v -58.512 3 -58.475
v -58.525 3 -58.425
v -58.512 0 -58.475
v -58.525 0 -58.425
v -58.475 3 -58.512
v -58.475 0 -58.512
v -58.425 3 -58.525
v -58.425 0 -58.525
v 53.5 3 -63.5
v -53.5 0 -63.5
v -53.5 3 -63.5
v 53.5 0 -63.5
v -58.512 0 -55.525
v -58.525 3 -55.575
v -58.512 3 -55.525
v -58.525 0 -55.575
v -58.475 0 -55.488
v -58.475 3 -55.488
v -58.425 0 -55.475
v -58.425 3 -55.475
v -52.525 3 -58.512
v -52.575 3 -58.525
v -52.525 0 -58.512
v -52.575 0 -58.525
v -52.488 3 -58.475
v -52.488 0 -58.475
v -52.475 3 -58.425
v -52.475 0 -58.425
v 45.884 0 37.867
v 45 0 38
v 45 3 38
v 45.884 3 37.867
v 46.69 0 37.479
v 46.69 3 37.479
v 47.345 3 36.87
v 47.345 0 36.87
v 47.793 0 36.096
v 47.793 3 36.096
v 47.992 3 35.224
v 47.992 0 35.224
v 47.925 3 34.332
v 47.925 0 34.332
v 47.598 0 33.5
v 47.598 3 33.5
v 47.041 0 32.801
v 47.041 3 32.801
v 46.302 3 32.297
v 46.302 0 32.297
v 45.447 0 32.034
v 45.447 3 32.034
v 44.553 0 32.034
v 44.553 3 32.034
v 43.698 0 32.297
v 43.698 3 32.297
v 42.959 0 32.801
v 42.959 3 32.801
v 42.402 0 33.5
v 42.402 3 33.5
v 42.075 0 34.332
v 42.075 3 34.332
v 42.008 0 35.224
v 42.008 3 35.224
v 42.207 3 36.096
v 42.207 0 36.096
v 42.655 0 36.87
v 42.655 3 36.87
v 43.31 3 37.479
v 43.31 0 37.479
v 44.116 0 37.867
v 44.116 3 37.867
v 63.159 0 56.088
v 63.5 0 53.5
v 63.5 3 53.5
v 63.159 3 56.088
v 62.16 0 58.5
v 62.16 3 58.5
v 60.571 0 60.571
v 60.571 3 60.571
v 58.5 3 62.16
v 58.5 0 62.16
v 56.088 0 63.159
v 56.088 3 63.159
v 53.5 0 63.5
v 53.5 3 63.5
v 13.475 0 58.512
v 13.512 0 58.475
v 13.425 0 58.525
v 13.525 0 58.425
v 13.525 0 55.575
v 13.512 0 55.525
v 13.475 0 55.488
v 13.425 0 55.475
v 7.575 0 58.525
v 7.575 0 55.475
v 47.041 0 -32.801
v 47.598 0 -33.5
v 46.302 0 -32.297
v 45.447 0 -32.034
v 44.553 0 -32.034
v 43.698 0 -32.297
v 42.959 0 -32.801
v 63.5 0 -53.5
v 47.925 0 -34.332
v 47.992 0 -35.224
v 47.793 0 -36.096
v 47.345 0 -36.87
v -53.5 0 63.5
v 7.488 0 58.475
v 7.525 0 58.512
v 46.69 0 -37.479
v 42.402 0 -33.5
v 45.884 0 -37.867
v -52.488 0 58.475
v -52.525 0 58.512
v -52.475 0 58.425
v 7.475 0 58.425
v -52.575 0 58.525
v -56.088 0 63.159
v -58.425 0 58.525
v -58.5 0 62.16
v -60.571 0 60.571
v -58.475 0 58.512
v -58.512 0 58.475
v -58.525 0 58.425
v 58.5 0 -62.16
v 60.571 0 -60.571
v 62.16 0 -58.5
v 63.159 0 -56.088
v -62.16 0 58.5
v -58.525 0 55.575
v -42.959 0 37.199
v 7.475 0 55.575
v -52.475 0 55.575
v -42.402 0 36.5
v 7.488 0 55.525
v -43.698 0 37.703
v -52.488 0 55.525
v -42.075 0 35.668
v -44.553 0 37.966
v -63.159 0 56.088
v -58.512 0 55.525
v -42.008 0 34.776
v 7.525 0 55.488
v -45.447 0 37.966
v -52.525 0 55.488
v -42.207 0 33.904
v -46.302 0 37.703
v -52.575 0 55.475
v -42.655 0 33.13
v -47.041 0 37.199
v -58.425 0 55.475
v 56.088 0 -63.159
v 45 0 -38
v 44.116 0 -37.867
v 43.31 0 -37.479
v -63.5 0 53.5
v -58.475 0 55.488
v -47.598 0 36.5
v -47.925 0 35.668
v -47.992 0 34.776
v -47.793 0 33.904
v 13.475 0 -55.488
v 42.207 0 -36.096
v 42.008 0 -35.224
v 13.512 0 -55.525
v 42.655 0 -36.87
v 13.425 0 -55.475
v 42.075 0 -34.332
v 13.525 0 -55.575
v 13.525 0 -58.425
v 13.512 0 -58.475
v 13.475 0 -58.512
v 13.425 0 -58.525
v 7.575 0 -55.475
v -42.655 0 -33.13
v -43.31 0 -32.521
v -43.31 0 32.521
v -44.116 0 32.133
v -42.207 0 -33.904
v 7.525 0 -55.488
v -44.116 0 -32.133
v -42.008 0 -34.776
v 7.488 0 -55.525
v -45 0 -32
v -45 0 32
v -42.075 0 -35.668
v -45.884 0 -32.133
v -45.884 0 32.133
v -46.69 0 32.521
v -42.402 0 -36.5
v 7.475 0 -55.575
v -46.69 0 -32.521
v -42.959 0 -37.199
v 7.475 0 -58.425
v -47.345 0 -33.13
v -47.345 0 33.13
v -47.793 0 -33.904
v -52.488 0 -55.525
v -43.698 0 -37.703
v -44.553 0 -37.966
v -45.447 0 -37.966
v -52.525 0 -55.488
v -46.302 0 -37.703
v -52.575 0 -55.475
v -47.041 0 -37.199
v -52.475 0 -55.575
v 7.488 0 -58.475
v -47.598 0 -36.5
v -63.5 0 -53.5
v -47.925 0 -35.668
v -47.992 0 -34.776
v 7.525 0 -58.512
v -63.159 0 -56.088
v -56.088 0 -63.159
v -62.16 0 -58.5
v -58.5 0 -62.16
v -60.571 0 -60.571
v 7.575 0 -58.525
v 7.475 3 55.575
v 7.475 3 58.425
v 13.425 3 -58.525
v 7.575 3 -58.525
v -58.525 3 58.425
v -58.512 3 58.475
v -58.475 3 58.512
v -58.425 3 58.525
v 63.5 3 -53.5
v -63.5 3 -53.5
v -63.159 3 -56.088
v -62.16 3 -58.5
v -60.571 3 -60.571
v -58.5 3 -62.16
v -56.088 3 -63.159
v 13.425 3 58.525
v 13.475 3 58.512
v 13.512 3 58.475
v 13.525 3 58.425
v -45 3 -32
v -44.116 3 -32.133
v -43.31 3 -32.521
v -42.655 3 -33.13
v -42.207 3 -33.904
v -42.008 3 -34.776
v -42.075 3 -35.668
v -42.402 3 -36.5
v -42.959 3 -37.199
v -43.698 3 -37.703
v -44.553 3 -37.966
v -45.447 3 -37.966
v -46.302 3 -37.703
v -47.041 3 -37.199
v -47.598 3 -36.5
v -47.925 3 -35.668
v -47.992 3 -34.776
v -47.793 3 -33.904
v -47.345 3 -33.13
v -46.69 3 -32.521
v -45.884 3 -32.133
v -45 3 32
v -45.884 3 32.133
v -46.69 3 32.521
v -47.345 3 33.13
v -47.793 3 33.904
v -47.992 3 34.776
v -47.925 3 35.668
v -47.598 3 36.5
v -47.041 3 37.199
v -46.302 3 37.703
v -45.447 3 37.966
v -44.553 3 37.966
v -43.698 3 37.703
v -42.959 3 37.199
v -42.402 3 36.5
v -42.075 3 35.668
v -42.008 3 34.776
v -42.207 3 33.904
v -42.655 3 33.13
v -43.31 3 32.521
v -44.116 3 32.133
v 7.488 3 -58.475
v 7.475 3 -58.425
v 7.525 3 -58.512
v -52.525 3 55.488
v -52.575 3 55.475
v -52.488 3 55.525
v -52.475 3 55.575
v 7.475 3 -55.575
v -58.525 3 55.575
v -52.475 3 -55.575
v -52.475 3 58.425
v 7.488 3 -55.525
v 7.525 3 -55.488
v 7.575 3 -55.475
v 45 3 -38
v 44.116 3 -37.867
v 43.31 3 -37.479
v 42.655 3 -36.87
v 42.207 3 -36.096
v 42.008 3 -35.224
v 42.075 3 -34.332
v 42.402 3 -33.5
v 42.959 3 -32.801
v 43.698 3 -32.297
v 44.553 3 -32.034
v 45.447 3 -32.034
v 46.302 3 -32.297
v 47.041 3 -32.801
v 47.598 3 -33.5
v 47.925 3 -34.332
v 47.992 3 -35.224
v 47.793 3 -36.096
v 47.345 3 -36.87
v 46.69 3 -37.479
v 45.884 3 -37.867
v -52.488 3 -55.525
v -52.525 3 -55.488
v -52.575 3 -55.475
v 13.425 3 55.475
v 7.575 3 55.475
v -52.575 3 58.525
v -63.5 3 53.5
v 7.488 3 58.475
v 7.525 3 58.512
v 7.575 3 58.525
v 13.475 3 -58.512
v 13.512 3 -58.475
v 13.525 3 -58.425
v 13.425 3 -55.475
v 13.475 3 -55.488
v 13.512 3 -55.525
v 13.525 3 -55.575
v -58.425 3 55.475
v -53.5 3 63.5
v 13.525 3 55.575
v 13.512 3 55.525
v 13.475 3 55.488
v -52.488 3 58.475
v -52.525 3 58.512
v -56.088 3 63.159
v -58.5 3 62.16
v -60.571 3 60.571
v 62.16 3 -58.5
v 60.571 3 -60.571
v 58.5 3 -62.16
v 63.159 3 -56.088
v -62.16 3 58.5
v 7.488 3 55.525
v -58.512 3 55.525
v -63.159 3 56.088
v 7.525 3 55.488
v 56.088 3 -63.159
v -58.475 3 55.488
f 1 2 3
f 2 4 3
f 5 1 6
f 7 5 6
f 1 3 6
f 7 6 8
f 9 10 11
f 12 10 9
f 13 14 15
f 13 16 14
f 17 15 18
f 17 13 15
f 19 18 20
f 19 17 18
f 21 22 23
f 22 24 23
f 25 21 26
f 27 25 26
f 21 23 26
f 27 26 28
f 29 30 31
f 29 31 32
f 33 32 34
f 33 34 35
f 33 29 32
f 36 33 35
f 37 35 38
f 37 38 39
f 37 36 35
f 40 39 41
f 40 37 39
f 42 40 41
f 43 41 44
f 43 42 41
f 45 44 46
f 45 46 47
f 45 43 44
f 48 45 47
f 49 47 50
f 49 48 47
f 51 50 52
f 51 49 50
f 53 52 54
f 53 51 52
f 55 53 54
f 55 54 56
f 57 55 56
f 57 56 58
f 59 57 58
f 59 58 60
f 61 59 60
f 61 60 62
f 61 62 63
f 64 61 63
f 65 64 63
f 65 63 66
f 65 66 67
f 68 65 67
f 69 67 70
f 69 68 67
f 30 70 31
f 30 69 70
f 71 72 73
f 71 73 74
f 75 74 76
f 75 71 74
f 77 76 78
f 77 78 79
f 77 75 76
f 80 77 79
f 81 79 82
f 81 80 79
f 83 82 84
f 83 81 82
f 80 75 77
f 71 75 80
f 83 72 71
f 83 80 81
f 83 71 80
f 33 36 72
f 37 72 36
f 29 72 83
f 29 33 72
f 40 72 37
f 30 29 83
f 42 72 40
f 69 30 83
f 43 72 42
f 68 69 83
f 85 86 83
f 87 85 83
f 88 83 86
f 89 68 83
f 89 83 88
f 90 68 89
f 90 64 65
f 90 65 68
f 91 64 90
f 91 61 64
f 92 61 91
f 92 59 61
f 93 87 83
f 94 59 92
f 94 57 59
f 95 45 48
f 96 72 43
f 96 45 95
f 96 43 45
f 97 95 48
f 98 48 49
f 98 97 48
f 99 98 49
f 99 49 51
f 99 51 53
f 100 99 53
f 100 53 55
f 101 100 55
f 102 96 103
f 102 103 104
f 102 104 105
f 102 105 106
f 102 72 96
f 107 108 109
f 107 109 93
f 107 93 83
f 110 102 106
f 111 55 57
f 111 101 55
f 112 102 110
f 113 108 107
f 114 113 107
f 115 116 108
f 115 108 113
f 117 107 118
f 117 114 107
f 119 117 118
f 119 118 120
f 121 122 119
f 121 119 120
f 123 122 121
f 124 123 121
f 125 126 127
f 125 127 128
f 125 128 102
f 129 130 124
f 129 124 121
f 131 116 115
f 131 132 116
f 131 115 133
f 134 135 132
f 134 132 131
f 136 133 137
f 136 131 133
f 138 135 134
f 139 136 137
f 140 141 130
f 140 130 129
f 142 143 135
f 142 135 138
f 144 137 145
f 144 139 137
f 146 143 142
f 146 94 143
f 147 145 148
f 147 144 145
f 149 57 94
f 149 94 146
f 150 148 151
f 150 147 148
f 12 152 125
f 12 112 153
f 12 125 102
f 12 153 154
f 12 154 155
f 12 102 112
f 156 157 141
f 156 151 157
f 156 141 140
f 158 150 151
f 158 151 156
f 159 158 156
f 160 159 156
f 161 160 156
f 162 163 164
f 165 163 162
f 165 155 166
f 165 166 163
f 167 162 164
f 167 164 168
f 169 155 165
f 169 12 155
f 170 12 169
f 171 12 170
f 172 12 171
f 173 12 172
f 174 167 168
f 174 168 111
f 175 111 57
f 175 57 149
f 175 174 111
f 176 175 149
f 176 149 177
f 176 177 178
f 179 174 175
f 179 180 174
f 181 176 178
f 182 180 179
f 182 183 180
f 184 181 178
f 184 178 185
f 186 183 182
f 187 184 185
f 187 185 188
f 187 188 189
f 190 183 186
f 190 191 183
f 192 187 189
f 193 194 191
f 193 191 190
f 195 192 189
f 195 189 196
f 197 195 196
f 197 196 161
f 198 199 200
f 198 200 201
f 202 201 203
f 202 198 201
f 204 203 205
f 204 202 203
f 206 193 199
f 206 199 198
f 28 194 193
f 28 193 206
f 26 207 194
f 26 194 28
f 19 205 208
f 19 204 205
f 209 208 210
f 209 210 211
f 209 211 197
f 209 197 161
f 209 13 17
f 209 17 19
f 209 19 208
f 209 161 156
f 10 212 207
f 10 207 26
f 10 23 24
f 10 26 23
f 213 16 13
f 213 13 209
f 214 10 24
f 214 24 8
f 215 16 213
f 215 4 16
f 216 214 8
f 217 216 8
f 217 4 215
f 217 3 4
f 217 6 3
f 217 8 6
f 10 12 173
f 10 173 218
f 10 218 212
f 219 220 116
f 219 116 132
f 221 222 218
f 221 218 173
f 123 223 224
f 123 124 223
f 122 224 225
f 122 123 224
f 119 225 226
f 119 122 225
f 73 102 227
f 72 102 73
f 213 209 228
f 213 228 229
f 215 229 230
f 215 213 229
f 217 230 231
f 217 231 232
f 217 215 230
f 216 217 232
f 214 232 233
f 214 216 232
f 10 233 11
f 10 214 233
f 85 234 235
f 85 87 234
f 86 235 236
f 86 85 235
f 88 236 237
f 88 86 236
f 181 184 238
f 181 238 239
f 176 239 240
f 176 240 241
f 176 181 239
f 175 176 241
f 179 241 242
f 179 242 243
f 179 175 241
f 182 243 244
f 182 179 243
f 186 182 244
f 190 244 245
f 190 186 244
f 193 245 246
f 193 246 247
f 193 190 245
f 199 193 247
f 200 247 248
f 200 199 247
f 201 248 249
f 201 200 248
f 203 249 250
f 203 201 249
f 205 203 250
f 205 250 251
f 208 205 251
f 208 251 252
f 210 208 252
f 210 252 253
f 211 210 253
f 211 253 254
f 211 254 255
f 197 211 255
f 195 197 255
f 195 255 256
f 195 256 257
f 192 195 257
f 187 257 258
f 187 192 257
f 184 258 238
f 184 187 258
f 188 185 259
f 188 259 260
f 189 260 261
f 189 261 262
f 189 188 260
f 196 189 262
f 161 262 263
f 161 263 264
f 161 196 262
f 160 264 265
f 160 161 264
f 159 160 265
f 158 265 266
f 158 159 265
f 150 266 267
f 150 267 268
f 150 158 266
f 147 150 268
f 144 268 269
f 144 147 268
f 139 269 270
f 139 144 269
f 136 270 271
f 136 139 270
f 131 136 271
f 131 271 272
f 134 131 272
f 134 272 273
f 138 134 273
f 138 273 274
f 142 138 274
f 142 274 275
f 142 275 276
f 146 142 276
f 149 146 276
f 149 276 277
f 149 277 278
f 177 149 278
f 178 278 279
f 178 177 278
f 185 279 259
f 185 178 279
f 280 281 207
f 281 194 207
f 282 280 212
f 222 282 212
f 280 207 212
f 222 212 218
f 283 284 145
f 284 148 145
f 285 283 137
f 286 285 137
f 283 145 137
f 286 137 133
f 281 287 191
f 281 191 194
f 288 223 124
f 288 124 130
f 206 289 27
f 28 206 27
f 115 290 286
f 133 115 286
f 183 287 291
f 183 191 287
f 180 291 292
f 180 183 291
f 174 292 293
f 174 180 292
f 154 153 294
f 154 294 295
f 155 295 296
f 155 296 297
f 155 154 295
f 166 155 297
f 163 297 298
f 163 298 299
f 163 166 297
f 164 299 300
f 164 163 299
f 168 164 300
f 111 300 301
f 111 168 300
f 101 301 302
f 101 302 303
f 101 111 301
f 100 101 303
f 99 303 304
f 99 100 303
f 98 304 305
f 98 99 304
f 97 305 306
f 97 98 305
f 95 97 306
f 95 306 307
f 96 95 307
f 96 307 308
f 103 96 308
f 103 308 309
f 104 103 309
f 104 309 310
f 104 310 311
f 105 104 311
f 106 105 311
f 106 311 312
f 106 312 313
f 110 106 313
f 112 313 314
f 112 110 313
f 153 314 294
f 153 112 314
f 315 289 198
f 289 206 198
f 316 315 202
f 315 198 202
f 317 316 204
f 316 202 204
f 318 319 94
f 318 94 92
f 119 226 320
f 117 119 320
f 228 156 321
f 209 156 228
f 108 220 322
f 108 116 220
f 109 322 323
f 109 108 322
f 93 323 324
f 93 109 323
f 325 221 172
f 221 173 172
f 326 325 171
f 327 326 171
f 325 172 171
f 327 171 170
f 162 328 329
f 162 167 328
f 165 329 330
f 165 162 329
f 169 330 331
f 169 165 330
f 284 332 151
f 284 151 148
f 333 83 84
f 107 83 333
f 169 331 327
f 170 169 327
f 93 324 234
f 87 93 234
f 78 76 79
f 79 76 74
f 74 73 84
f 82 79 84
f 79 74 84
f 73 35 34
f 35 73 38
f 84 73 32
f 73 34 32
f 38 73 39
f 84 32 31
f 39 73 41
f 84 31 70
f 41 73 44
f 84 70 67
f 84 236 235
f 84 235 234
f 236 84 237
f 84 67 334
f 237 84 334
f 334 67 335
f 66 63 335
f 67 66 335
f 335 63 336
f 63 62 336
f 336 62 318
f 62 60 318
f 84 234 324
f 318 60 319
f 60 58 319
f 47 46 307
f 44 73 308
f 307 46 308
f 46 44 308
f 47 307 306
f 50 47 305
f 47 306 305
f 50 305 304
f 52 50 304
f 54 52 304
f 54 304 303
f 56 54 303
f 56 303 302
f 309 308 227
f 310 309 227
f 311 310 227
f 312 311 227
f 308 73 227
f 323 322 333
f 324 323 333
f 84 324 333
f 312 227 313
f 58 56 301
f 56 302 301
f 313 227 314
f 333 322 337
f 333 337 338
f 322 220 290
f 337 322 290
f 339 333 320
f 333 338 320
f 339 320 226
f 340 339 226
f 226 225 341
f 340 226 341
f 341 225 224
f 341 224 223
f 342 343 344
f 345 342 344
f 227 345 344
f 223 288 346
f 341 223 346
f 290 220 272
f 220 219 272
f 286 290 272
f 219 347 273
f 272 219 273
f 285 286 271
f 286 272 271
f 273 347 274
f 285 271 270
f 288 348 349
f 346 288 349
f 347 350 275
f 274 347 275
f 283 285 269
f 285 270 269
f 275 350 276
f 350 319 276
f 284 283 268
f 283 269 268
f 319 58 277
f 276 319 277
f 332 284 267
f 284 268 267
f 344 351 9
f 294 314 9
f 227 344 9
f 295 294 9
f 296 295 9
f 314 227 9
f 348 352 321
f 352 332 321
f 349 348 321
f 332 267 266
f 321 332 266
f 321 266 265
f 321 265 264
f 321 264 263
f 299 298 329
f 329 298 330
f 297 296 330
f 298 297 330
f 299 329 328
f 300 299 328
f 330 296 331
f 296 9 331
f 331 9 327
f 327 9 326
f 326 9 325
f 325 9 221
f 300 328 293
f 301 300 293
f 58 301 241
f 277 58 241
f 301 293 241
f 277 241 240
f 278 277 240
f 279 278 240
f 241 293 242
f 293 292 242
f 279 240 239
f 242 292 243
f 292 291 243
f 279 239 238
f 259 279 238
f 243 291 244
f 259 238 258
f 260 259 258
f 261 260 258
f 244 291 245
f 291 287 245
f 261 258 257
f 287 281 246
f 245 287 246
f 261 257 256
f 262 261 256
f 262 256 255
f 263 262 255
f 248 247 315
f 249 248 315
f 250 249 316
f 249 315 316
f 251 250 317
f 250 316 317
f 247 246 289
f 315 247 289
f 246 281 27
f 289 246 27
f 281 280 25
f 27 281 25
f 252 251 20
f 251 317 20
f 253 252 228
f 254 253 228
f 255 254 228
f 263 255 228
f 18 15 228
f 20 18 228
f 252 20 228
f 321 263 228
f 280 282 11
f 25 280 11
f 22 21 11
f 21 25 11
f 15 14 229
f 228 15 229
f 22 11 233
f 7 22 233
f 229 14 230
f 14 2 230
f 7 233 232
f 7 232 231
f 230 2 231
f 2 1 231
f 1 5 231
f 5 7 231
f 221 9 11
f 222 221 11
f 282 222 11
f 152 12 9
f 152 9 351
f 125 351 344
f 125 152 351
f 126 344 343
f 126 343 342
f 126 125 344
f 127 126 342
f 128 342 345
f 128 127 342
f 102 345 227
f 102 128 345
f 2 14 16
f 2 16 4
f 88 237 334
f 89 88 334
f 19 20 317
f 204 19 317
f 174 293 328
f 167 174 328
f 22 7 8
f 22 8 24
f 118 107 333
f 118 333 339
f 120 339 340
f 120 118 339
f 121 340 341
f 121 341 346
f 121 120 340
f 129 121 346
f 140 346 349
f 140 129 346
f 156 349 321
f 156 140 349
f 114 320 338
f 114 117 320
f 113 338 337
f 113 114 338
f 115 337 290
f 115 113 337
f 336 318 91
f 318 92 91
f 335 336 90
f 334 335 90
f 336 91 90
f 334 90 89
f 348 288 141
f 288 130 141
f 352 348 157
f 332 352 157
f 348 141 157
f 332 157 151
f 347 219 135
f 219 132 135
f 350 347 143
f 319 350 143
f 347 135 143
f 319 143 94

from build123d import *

# Parameters (mm, degrees)
SKETCH1_R           = 3
BOSS_EXTRUDE1_DEPTH = 3
CUT_EXTRUDE1_REACH  = 91.853
SKETCH2_W           = 6.05
SKETCH2_H           = 3.05
FILLET1_R           = 0.1


with BuildPart() as part:
    # Sketch1 → Boss-Extrude1 (new body)
    with BuildSketch(Plane(origin=(0, 0, 0), x_dir=(1, 0, 0), z_dir=(0, 1, 0))):
        with BuildLine():
            Line((-53.5, 63.5), (53.5, 63.5))
            ThreePointArc((53.5, 63.5), (60.571067812, 60.571067812), (63.5, 53.5))
            Line((63.5, 53.5), (63.5, -53.5))
            ThreePointArc((63.5, -53.5), (60.571067812, -60.571067812), (53.5, -63.5))
            Line((53.5, -63.5), (-53.5, -63.5))
            ThreePointArc((-53.5, -63.5), (-60.571067812, -60.571067812), (-63.5, -53.5))
            Line((-63.5, -53.5), (-63.5, 53.5))
            ThreePointArc((-63.5, 53.5), (-60.571067812, 60.571067812), (-53.5, 63.5))
        make_face()
        with Locations(Location((-45, 35, 0), (0, 0, 270))):
            Circle(SKETCH1_R, mode=Mode.SUBTRACT)
        with Locations(Location((45, 35, 0), (0, 0, 90))):
            Circle(SKETCH1_R, mode=Mode.SUBTRACT)
        with Locations(Location((45, -35, 0), (0, 0, 270))):
            Circle(SKETCH1_R, mode=Mode.SUBTRACT)
        with Locations(Location((-45, -35, 0), (0, 0, 90))):
            Circle(SKETCH1_R, mode=Mode.SUBTRACT)
    extrude(amount=BOSS_EXTRUDE1_DEPTH)

    # Sketch2 → Cut-Extrude1 (cut, up to next)
    with BuildSketch(Plane(origin=(0, 3, 0), x_dir=(1, 0, 0), z_dir=(0, 1, 0)), mode=Mode.PRIVATE) as cut_extrude1_sk1:
        with Locations((-55.5, -57)):
            Rectangle(SKETCH2_W, SKETCH2_H)
    cut_extrude1_tool1 = extrude(cut_extrude1_sk1.sketch, amount=-CUT_EXTRUDE1_REACH, mode=Mode.PRIVATE) & part.part
    # Sketch2 → Cut-Extrude1 (cut, up to next)
    with BuildSketch(Plane(origin=(0, 3, 0), x_dir=(1, 0, 0), z_dir=(0, 1, 0)), mode=Mode.PRIVATE) as cut_extrude1_sk2:
        with Locations((10.5, -57)):
            Rectangle(SKETCH2_W, SKETCH2_H)
    cut_extrude1_tool2 = extrude(cut_extrude1_sk2.sketch, amount=-CUT_EXTRUDE1_REACH, mode=Mode.PRIVATE) & part.part
    # Sketch2 → Cut-Extrude1 (cut, up to next)
    with BuildSketch(Plane(origin=(0, 3, 0), x_dir=(1, 0, 0), z_dir=(0, 1, 0)), mode=Mode.PRIVATE) as cut_extrude1_sk3:
        with Locations((10.5, 57)):
            Rectangle(SKETCH2_W, SKETCH2_H)
    cut_extrude1_tool3 = extrude(cut_extrude1_sk3.sketch, amount=-CUT_EXTRUDE1_REACH, mode=Mode.PRIVATE) & part.part
    # Sketch2 → Cut-Extrude1 (cut, up to next)
    with BuildSketch(Plane(origin=(0, 3, 0), x_dir=(1, 0, 0), z_dir=(0, 1, 0)), mode=Mode.PRIVATE) as cut_extrude1_sk4:
        with Locations((-55.5, 57)):
            Rectangle(SKETCH2_W, SKETCH2_H)
    cut_extrude1_tool4 = extrude(cut_extrude1_sk4.sketch, amount=-CUT_EXTRUDE1_REACH, mode=Mode.PRIVATE) & part.part
    add(cut_extrude1_tool1.solids().sort_by_distance((-55.5, 3, 57))[0], mode=Mode.SUBTRACT)
    add(cut_extrude1_tool2.solids().sort_by_distance((10.5, 3, 57))[0], mode=Mode.SUBTRACT)
    add(cut_extrude1_tool3.solids().sort_by_distance((10.5, 3, -57))[0], mode=Mode.SUBTRACT)
    add(cut_extrude1_tool4.solids().sort_by_distance((-55.5, 3, -57))[0], mode=Mode.SUBTRACT)

    # Fillet1
    fillet1_edges = [part.edges().sort_by_distance(p)[0] for p in [
        (13.525, 1.5, -58.525),
        (13.525, 1.5, -55.475),
        (7.475, 1.5, -55.475),
        (7.475, 1.5, -58.525),
        (-58.525, 1.5, 58.525),
        (-58.525, 1.5, 55.475),
        (-52.475, 1.5, 55.475),
        (-52.475, 1.5, 58.525),
        (13.525, 1.5, 55.475),
        (13.525, 1.5, 58.525),
        (7.475, 1.5, 58.525),
        (7.475, 1.5, 55.475),
        (-58.525, 1.5, -55.475),
        (-58.525, 1.5, -58.525),
        (-52.475, 1.5, -58.525),
        (-52.475, 1.5, -55.475),
    ]]
    fillet(fillet1_edges, radius=FILLET1_R)


solid = part.part
